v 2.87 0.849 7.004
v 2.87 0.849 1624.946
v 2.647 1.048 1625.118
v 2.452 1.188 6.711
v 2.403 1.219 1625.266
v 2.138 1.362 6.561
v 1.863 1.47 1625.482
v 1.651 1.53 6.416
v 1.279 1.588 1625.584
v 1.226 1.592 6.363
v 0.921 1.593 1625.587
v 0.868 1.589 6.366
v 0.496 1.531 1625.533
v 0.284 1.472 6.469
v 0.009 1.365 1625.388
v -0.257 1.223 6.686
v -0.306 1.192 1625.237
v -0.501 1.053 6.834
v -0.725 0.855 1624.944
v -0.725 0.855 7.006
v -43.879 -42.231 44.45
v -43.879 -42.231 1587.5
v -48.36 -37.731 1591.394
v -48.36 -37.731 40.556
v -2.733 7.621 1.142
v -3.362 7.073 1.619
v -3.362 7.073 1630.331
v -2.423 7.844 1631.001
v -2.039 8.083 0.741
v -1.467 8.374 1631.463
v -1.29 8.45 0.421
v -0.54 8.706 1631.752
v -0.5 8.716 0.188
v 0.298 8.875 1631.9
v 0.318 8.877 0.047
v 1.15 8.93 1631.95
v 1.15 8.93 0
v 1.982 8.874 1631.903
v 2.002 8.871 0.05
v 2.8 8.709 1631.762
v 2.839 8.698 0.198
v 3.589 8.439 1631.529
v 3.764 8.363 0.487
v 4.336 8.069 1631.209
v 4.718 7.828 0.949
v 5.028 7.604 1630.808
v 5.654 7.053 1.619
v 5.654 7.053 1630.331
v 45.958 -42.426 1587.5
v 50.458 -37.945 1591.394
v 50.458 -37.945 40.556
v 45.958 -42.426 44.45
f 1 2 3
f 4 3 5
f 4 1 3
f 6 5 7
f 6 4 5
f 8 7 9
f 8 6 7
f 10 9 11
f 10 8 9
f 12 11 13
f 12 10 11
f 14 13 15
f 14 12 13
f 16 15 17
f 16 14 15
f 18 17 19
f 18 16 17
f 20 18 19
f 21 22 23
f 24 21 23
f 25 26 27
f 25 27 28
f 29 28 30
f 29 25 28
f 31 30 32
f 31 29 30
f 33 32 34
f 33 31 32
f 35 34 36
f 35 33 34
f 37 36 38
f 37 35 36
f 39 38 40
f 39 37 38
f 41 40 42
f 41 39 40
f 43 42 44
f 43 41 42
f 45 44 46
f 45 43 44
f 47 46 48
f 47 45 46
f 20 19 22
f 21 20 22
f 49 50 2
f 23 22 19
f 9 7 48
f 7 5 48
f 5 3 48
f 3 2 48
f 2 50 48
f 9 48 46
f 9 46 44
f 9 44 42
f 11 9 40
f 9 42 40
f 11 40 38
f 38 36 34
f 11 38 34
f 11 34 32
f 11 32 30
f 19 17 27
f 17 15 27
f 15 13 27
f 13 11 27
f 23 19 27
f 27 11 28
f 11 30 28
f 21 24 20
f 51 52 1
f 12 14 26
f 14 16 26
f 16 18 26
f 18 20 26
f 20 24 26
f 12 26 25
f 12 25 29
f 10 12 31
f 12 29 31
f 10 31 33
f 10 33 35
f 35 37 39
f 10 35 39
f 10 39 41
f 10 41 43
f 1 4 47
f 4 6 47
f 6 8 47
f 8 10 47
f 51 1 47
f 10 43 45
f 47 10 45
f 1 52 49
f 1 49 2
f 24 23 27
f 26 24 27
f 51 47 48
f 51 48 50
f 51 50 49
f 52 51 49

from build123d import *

# Parameters (mm, degrees)
BOSS_EXTRUDE1_DEPTH = 1631.95
CUT_EXTRUDE2_DEPTH  = 76.2
SKETCH11_W          = 116.748947554
SKETCH11_H          = 157.612376209
CUT_EXTRUDE3_DEPTH  = 76.2


with BuildPart() as part:
    # Sketch1 → Boss-Extrude1 (new body)
    with BuildSketch(Plane.XY):
        with BuildLine():
            Line((-43.879451284, -42.2312162), (-48.35985275, -37.73138257))
            Line((-48.35985275, -37.73138257), (-3.361516443, 7.07263209))
            ThreePointArc((-3.361516443, 7.07263209), (1.150121774, 8.929986414), (5.653679589, 7.053124274))
            Line((5.653679589, 7.053124274), (50.457694249, -37.945212032))
            Line((50.457694249, -37.945212032), (45.957860619, -42.425613498))
            Line((45.957860619, -42.425613498), (2.869929296, 0.849196564))
            ThreePointArc((2.869929296, 0.849196564), (1.073761457, 1.597033186), (-0.724615856, 0.854525573))
            Line((-0.724615856, 0.854525573), (-43.879451284, -42.2312162))
        make_face()
    extrude(amount=BOSS_EXTRUDE1_DEPTH)

    # Sketch10 → Cut-Extrude2 (cut)
    with BuildSketch(Plane(origin=(-1.739591993, -803.922021371, 927.063003524), x_dir=(0.999998995, -0.000928778, 0.001071044), z_dir=(-0.001417661, -0.655147382, 0.755499767))):
        Polygon((-72.388022704, 958.296853766), (-72.388022704, 1089.35007065), (76.019748324, 1091.938631218), (76.019748324, 958.296853766), align=None)
    extrude(amount=CUT_EXTRUDE2_DEPTH, mode=Mode.SUBTRACT)

    # Sketch11 → Cut-Extrude3 (cut)
    with BuildSketch(Plane(origin=(0.008296278, 3.83397994, 4.421250898), x_dir=(0.999998995, -0.000928778, -0.001071044), z_dir=(0.001417661, 0.655147382, 0.755499767))):
        with Locations((-6.183779703, -23.975283789)):
            Rectangle(SKETCH11_W, SKETCH11_H)
    extrude(amount=-CUT_EXTRUDE3_DEPTH, mode=Mode.SUBTRACT)


solid = part.part
